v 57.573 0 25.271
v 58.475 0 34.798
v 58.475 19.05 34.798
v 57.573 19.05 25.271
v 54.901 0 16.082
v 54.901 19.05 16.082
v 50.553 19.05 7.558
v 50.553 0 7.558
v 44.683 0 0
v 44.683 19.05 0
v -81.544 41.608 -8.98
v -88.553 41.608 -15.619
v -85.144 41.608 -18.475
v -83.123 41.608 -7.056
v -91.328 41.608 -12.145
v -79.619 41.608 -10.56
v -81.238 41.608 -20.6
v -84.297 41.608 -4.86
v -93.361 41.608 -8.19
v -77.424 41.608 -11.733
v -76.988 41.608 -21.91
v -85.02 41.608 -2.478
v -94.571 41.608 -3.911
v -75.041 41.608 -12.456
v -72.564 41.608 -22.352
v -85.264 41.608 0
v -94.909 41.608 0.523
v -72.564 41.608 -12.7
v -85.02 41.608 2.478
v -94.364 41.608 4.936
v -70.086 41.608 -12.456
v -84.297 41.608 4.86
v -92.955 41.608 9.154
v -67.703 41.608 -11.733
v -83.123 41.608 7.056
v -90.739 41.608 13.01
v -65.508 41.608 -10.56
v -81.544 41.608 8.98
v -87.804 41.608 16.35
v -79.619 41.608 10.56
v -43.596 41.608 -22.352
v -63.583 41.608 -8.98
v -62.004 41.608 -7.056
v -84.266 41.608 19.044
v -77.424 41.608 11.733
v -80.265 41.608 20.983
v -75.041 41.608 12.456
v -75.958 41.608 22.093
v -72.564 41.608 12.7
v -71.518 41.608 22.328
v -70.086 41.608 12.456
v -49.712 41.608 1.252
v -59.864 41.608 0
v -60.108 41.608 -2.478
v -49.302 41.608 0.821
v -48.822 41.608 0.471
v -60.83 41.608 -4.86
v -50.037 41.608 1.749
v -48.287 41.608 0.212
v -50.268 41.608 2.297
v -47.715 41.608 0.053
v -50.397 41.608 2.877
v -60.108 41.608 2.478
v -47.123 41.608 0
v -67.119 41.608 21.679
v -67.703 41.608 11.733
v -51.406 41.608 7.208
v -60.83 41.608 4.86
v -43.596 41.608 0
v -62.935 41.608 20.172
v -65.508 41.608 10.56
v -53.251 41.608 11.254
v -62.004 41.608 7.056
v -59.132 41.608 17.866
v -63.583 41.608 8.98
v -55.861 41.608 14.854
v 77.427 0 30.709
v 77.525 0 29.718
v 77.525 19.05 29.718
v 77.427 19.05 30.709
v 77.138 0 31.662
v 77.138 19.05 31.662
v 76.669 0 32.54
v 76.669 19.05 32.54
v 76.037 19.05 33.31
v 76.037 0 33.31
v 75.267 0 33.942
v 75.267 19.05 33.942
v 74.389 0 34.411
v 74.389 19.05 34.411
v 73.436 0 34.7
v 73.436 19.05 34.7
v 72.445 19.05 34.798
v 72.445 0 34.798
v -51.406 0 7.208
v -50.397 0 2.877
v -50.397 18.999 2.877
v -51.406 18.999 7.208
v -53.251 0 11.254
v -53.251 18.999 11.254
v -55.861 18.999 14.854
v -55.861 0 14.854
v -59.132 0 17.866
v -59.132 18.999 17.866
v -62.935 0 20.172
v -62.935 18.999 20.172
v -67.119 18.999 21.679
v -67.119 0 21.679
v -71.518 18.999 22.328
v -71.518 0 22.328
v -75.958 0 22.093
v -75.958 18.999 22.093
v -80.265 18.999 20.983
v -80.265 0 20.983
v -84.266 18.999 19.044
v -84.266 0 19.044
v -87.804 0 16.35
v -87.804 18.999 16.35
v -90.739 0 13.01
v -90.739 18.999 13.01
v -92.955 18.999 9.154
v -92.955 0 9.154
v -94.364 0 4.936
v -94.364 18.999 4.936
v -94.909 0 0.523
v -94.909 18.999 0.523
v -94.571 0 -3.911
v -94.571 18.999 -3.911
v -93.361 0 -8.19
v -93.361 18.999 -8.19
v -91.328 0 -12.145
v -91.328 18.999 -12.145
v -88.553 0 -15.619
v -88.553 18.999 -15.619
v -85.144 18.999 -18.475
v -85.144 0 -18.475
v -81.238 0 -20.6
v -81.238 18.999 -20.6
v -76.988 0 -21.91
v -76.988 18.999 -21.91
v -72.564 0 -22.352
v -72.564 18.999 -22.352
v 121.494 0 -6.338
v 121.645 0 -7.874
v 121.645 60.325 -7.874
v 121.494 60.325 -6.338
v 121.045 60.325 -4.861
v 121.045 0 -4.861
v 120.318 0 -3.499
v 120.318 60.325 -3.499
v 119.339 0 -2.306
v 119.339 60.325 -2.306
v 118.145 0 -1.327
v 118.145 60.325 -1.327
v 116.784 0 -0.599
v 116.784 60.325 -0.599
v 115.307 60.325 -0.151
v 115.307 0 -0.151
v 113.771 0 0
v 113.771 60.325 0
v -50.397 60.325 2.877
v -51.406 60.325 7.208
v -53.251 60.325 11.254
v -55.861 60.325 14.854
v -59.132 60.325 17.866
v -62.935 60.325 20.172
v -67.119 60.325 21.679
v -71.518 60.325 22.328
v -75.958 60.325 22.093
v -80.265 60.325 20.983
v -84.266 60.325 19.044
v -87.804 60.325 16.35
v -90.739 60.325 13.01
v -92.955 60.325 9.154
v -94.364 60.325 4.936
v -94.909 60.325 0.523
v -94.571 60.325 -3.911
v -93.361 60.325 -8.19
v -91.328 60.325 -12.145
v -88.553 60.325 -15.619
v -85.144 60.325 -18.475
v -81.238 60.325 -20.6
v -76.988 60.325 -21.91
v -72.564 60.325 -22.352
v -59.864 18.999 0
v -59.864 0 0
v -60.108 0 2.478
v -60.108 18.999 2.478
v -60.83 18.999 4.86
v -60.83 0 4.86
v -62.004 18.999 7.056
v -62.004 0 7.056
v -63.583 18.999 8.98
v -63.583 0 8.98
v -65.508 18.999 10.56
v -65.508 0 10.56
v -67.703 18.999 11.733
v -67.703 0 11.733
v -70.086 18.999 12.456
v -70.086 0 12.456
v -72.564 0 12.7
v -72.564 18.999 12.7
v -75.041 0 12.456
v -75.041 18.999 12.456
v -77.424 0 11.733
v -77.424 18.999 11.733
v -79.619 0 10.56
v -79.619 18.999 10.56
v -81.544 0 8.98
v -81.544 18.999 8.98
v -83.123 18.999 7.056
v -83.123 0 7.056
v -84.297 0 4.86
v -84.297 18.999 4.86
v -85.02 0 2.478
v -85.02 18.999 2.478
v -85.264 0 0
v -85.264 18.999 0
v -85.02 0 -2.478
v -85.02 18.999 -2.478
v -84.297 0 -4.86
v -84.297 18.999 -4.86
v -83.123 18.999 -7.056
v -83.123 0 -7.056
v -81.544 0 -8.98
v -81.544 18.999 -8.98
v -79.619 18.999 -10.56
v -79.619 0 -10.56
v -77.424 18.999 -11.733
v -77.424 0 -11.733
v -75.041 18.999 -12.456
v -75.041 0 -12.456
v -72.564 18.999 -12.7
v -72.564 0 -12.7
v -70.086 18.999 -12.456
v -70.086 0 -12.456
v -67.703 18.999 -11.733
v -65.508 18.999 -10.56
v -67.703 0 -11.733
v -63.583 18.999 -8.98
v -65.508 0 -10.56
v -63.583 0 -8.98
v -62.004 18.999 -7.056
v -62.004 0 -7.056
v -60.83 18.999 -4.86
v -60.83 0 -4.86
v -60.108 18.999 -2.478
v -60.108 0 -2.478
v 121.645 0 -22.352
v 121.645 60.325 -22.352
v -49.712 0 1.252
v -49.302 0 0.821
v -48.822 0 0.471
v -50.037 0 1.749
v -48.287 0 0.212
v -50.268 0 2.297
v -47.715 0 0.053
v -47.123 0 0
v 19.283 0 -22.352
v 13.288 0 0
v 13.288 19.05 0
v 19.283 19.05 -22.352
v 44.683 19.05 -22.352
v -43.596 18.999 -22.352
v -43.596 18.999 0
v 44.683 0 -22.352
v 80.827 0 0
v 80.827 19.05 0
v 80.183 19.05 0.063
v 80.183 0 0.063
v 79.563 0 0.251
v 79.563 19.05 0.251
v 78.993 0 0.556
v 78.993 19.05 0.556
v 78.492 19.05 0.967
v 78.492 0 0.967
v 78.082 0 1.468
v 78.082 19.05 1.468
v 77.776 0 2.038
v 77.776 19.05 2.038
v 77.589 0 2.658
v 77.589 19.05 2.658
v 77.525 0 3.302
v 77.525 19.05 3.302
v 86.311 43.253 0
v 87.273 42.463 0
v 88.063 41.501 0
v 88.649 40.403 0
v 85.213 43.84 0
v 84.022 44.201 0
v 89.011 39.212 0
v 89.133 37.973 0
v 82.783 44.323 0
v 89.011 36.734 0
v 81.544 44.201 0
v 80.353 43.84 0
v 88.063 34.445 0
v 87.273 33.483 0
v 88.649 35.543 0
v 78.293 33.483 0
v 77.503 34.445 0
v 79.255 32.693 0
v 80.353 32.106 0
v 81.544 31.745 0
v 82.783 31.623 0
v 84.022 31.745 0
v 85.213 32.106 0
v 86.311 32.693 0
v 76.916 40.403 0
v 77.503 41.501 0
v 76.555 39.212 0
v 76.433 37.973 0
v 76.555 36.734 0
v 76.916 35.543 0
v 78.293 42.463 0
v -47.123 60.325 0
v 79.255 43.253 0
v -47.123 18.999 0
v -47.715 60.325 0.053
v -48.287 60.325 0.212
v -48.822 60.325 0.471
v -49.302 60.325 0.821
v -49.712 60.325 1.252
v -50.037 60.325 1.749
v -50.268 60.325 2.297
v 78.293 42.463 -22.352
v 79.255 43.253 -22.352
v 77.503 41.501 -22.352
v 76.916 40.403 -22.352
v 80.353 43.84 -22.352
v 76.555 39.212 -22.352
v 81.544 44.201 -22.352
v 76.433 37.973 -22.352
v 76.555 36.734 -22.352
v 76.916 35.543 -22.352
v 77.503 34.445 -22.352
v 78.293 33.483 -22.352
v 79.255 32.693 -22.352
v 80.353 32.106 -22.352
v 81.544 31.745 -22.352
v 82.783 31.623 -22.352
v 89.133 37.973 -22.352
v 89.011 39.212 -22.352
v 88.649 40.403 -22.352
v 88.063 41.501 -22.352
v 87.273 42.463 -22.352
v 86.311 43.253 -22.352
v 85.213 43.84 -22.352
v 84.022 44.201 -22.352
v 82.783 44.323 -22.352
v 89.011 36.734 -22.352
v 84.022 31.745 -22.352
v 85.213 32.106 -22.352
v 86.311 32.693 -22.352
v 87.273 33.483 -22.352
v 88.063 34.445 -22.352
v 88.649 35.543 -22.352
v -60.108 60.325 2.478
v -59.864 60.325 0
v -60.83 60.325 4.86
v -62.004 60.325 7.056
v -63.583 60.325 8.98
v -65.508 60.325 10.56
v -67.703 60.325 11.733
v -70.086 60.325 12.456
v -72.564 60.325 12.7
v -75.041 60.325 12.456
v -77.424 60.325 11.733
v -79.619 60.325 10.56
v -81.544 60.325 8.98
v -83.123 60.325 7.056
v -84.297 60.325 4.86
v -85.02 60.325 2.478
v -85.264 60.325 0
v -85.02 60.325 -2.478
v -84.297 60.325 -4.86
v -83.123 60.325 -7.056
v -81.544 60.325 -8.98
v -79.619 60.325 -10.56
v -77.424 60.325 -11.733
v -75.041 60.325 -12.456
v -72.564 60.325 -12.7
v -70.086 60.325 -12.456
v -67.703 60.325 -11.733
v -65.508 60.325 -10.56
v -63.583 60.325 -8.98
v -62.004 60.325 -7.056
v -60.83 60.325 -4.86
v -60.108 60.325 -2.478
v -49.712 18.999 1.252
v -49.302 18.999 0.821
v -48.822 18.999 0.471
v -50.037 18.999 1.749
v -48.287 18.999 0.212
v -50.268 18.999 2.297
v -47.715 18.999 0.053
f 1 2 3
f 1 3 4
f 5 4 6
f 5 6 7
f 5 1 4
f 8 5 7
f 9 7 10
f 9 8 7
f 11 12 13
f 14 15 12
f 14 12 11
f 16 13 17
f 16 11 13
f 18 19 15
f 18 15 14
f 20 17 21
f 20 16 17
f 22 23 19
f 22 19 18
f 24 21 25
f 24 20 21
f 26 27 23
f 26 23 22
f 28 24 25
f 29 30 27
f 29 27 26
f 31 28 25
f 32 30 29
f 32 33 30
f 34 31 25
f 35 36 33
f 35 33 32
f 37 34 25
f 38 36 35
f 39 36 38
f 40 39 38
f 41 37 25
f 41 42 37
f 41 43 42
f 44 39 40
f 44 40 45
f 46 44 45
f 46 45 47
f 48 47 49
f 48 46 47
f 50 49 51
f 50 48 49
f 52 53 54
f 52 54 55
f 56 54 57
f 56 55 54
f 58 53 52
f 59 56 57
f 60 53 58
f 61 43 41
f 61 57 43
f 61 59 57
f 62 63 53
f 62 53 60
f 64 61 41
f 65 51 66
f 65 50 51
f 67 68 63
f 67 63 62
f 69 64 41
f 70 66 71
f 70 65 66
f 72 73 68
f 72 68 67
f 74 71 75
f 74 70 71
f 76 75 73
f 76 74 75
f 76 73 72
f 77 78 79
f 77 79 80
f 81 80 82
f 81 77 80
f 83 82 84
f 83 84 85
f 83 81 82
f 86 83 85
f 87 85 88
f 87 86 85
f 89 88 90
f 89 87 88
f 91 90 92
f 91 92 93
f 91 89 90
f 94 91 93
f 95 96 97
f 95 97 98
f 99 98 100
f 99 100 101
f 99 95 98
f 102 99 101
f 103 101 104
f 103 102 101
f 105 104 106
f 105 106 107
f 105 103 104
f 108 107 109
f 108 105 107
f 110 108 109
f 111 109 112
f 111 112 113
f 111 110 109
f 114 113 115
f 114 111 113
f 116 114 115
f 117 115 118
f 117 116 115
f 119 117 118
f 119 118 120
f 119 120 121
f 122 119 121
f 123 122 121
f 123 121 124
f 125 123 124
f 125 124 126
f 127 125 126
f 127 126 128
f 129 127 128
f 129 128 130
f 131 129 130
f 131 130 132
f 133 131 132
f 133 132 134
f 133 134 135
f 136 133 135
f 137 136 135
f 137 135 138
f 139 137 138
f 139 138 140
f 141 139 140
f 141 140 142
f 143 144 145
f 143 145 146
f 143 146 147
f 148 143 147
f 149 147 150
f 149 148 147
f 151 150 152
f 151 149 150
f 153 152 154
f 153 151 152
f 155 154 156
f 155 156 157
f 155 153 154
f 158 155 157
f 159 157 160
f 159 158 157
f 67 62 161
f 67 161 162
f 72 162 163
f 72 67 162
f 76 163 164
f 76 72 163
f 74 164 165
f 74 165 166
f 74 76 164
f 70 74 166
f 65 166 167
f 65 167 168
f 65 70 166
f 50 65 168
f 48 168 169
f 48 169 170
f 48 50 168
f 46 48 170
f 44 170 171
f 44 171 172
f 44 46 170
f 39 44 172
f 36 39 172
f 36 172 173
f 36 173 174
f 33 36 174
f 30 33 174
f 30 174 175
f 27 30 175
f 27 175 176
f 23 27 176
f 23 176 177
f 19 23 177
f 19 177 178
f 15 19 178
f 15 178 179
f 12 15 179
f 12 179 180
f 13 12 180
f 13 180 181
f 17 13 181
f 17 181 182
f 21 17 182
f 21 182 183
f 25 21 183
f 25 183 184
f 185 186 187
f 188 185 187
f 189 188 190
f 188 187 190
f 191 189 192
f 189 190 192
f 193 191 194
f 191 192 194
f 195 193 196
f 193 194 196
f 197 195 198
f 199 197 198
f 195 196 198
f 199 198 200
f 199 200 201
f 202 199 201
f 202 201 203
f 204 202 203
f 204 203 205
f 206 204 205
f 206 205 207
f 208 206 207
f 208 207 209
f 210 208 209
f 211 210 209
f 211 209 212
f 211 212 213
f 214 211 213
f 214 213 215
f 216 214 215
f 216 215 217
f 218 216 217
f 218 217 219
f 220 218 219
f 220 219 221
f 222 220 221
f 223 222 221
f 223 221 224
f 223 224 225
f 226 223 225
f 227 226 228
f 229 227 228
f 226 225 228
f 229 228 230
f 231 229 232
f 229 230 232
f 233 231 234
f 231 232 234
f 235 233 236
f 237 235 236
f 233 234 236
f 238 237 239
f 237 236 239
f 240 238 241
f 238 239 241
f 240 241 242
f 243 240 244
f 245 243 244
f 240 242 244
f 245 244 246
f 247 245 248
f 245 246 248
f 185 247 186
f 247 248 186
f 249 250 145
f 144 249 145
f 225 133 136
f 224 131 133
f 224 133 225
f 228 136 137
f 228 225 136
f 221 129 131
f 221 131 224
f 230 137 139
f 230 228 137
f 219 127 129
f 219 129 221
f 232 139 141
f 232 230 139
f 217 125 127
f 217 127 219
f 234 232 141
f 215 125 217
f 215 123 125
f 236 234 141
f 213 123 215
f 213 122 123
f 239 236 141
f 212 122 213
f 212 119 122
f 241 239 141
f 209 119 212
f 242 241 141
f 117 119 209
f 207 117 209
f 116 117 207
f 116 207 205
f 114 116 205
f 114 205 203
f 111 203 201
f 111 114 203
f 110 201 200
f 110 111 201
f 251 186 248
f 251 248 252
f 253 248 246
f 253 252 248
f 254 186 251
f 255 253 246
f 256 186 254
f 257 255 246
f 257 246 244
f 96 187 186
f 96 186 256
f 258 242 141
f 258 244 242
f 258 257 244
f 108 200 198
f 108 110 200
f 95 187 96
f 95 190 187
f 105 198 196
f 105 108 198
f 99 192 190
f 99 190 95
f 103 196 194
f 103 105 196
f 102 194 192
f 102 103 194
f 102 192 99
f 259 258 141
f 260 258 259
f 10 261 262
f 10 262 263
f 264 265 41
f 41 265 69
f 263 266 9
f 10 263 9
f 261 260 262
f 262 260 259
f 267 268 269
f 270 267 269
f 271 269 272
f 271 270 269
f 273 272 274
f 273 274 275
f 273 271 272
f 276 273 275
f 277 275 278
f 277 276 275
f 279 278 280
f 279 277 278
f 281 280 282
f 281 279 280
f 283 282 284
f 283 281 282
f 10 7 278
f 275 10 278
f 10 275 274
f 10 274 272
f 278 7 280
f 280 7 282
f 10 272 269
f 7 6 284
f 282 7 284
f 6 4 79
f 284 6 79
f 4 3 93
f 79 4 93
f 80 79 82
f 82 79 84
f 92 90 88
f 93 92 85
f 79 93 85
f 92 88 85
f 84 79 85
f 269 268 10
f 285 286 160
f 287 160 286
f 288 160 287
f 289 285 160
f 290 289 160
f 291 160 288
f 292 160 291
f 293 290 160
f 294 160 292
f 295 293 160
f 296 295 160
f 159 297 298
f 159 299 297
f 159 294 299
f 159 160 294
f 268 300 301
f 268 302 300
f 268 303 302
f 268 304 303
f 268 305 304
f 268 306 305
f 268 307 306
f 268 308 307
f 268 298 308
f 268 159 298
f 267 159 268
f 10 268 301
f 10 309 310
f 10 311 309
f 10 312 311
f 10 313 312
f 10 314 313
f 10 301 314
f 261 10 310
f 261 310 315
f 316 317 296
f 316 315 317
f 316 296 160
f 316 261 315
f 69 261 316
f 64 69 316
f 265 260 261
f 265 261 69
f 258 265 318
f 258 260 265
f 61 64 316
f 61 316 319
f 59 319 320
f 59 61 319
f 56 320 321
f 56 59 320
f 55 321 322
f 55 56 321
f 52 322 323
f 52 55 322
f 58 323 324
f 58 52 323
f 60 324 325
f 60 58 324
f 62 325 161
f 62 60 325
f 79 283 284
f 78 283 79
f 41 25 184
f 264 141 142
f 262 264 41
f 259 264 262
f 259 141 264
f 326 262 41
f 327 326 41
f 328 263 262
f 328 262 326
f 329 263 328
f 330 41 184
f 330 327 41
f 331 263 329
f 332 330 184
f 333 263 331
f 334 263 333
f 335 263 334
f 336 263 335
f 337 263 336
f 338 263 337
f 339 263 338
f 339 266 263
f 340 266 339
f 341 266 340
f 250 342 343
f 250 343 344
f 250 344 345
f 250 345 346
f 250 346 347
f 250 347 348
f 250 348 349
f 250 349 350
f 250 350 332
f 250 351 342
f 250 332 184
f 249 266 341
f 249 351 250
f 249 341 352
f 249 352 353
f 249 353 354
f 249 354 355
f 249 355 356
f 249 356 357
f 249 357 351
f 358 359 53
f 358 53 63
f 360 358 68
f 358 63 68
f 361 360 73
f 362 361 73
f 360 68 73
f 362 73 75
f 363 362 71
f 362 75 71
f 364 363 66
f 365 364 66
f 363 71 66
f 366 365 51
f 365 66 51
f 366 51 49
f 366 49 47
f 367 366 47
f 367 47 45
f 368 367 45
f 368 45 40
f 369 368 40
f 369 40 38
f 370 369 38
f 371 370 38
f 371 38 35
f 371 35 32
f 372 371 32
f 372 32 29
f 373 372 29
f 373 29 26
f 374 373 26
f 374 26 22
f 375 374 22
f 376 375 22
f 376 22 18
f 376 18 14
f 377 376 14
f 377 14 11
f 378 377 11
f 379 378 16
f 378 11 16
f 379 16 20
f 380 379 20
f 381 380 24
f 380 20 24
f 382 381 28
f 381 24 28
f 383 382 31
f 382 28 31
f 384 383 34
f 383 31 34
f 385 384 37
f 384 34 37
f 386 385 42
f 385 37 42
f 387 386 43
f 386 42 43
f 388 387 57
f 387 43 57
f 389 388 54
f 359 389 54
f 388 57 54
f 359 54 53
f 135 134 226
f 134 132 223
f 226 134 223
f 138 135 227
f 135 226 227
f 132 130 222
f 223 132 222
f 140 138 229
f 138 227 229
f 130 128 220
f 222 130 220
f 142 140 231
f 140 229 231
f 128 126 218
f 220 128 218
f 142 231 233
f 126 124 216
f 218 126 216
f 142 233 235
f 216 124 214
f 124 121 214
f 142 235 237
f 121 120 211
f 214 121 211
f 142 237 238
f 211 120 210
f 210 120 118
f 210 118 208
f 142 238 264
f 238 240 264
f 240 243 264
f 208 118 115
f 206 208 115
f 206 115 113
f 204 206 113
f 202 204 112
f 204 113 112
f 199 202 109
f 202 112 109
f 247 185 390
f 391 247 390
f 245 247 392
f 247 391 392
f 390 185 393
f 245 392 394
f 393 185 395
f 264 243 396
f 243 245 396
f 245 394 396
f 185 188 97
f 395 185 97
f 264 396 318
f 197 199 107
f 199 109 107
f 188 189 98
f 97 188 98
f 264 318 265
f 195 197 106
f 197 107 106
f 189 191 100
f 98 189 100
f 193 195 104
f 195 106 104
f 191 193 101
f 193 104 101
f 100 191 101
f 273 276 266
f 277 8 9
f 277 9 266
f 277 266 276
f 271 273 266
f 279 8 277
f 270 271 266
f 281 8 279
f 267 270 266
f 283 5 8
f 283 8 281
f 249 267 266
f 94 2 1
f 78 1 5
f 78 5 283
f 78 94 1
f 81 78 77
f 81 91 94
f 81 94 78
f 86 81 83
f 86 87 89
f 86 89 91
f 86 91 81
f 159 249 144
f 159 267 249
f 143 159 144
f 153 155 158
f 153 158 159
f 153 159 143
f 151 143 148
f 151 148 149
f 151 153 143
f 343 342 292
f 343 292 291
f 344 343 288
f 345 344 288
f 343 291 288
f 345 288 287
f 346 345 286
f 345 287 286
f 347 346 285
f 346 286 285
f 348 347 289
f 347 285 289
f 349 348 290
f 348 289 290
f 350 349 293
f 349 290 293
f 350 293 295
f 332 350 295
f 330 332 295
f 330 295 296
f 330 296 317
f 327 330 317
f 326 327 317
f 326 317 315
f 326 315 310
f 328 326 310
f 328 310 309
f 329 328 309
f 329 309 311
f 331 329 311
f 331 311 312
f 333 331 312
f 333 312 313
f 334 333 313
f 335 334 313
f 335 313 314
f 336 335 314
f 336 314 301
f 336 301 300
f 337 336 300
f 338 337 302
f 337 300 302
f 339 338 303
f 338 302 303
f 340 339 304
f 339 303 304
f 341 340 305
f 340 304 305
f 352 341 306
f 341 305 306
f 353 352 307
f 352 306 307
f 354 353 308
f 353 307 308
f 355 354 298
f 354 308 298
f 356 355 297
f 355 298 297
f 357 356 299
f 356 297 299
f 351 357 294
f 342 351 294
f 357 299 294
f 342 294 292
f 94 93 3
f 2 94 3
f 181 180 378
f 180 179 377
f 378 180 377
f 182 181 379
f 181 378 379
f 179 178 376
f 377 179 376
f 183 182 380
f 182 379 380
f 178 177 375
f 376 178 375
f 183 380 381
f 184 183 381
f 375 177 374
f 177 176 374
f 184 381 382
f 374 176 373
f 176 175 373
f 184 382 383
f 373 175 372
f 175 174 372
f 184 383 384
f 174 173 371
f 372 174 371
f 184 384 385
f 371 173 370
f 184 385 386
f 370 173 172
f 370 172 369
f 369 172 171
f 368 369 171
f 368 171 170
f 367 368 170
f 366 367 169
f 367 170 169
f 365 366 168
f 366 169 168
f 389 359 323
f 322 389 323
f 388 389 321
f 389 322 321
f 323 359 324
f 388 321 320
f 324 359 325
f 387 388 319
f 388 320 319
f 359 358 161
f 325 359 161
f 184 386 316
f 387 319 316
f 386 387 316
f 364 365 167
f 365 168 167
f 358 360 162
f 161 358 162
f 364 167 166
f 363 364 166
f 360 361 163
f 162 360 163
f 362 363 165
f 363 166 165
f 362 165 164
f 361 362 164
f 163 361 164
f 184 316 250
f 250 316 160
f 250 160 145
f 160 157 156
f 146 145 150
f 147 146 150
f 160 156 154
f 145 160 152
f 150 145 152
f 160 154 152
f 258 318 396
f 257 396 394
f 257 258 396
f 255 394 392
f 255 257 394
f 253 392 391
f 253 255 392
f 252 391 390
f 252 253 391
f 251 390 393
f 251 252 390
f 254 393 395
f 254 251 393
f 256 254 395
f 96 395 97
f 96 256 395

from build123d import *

# Parameters (mm, degrees)
F0_R     = 12.7
F1_DEPTH = 60.325
F2_W     = 51.3197111964
F2_H     = 22.6086642011
F3_DEPTH = 55.88
F4_DEPTH = 19.05
F5_DEPTH = 19.05
F6_R     = 6.35
F7_DEPTH = 22.353


with BuildPart() as f1:
    # F0 (on Front) → F1 (new body)
    with BuildSketch(Plane.XZ):
        with BuildLine():
            ThreePointArc((-47.1229317725, 0), (-49.3023607466, 0.8214167326), (-50.3974654162, 2.876990099))
            ThreePointArc((-50.3974654162, 2.876990099), (-89.3551798917, 14.7530576713), (-72.5635393124, -22.352))
            Line((-72.5635393124, -22.352), (19.2828606876, -22.352))
            Line((19.2828606876, -22.352), (13.2884606876, 0))
            Line((13.2884606876, 0), (-47.1229317725, 0))
        make_face()
        with Locations((-72.5635393124, 0)):
            Circle(F0_R, mode=Mode.SUBTRACT)
        Polygon((13.2884606876, 0), (19.2828606876, -22.352), (44.6828606876, -22.352), (44.6828606876, 0), align=None)
        with BuildLine():
            Line((44.6828606876, 0), (44.6828606876, -22.352))
            Line((44.6828606876, -22.352), (121.6448606876, -22.352))
            Line((121.6448606876, -22.352), (121.6448606876, -7.874))
            ThreePointArc((121.6448606876, -7.874), (119.3386194827, -2.3062412049), (113.7708606876, 0))
            Line((113.7708606876, 0), (80.8270606876, 0))
            Line((80.8270606876, 0), (44.6828606876, 0))
        make_face()
    extrude(amount=-F1_DEPTH)

    # F2 (on Top) → F3 (cut, symmetric)
    with BuildSketch(Plane.XY):
        with Locations((-69.2556837142, 30.3035321005)):
            Rectangle(F2_W, F2_H)
    extrude(amount=F3_DEPTH, both=True, mode=Mode.SUBTRACT)

    # F0 (on Front) → F4 (cut)
    with BuildSketch(Plane.XZ):
        Polygon((13.2884606876, 0), (19.2828606876, -22.352), (44.6828606876, -22.352), (44.6828606876, 0), align=None)
    extrude(amount=-F4_DEPTH, mode=Mode.SUBTRACT)

    # F0 (on Front) → F5 (join)
    with BuildSketch(Plane.XZ):
        with BuildLine():
            ThreePointArc((58.4750606876, 34.798), (54.9008760492, 16.0823576341), (44.6828606876, 0))
            Line((44.6828606876, 0), (80.8270606876, 0))
            ThreePointArc((80.8270606876, 0), (78.4921940962, 0.9671334085), (77.5250606876, 3.302))
            Line((77.5250606876, 3.302), (77.5250606876, 29.718))
            ThreePointArc((77.5250606876, 29.718), (76.0371631361, 33.3101024484), (72.4450606876, 34.798))
            Line((72.4450606876, 34.798), (58.4750606876, 34.798))
        make_face()
    extrude(amount=-F5_DEPTH)

    # F6 (on Top) → F7 (cut, through all)
    with BuildSketch(Plane.XY):
        with Locations((82.7828606876, 37.973)):
            Circle(F6_R)
    extrude(amount=-F7_DEPTH, mode=Mode.SUBTRACT)


solid = f1.part
